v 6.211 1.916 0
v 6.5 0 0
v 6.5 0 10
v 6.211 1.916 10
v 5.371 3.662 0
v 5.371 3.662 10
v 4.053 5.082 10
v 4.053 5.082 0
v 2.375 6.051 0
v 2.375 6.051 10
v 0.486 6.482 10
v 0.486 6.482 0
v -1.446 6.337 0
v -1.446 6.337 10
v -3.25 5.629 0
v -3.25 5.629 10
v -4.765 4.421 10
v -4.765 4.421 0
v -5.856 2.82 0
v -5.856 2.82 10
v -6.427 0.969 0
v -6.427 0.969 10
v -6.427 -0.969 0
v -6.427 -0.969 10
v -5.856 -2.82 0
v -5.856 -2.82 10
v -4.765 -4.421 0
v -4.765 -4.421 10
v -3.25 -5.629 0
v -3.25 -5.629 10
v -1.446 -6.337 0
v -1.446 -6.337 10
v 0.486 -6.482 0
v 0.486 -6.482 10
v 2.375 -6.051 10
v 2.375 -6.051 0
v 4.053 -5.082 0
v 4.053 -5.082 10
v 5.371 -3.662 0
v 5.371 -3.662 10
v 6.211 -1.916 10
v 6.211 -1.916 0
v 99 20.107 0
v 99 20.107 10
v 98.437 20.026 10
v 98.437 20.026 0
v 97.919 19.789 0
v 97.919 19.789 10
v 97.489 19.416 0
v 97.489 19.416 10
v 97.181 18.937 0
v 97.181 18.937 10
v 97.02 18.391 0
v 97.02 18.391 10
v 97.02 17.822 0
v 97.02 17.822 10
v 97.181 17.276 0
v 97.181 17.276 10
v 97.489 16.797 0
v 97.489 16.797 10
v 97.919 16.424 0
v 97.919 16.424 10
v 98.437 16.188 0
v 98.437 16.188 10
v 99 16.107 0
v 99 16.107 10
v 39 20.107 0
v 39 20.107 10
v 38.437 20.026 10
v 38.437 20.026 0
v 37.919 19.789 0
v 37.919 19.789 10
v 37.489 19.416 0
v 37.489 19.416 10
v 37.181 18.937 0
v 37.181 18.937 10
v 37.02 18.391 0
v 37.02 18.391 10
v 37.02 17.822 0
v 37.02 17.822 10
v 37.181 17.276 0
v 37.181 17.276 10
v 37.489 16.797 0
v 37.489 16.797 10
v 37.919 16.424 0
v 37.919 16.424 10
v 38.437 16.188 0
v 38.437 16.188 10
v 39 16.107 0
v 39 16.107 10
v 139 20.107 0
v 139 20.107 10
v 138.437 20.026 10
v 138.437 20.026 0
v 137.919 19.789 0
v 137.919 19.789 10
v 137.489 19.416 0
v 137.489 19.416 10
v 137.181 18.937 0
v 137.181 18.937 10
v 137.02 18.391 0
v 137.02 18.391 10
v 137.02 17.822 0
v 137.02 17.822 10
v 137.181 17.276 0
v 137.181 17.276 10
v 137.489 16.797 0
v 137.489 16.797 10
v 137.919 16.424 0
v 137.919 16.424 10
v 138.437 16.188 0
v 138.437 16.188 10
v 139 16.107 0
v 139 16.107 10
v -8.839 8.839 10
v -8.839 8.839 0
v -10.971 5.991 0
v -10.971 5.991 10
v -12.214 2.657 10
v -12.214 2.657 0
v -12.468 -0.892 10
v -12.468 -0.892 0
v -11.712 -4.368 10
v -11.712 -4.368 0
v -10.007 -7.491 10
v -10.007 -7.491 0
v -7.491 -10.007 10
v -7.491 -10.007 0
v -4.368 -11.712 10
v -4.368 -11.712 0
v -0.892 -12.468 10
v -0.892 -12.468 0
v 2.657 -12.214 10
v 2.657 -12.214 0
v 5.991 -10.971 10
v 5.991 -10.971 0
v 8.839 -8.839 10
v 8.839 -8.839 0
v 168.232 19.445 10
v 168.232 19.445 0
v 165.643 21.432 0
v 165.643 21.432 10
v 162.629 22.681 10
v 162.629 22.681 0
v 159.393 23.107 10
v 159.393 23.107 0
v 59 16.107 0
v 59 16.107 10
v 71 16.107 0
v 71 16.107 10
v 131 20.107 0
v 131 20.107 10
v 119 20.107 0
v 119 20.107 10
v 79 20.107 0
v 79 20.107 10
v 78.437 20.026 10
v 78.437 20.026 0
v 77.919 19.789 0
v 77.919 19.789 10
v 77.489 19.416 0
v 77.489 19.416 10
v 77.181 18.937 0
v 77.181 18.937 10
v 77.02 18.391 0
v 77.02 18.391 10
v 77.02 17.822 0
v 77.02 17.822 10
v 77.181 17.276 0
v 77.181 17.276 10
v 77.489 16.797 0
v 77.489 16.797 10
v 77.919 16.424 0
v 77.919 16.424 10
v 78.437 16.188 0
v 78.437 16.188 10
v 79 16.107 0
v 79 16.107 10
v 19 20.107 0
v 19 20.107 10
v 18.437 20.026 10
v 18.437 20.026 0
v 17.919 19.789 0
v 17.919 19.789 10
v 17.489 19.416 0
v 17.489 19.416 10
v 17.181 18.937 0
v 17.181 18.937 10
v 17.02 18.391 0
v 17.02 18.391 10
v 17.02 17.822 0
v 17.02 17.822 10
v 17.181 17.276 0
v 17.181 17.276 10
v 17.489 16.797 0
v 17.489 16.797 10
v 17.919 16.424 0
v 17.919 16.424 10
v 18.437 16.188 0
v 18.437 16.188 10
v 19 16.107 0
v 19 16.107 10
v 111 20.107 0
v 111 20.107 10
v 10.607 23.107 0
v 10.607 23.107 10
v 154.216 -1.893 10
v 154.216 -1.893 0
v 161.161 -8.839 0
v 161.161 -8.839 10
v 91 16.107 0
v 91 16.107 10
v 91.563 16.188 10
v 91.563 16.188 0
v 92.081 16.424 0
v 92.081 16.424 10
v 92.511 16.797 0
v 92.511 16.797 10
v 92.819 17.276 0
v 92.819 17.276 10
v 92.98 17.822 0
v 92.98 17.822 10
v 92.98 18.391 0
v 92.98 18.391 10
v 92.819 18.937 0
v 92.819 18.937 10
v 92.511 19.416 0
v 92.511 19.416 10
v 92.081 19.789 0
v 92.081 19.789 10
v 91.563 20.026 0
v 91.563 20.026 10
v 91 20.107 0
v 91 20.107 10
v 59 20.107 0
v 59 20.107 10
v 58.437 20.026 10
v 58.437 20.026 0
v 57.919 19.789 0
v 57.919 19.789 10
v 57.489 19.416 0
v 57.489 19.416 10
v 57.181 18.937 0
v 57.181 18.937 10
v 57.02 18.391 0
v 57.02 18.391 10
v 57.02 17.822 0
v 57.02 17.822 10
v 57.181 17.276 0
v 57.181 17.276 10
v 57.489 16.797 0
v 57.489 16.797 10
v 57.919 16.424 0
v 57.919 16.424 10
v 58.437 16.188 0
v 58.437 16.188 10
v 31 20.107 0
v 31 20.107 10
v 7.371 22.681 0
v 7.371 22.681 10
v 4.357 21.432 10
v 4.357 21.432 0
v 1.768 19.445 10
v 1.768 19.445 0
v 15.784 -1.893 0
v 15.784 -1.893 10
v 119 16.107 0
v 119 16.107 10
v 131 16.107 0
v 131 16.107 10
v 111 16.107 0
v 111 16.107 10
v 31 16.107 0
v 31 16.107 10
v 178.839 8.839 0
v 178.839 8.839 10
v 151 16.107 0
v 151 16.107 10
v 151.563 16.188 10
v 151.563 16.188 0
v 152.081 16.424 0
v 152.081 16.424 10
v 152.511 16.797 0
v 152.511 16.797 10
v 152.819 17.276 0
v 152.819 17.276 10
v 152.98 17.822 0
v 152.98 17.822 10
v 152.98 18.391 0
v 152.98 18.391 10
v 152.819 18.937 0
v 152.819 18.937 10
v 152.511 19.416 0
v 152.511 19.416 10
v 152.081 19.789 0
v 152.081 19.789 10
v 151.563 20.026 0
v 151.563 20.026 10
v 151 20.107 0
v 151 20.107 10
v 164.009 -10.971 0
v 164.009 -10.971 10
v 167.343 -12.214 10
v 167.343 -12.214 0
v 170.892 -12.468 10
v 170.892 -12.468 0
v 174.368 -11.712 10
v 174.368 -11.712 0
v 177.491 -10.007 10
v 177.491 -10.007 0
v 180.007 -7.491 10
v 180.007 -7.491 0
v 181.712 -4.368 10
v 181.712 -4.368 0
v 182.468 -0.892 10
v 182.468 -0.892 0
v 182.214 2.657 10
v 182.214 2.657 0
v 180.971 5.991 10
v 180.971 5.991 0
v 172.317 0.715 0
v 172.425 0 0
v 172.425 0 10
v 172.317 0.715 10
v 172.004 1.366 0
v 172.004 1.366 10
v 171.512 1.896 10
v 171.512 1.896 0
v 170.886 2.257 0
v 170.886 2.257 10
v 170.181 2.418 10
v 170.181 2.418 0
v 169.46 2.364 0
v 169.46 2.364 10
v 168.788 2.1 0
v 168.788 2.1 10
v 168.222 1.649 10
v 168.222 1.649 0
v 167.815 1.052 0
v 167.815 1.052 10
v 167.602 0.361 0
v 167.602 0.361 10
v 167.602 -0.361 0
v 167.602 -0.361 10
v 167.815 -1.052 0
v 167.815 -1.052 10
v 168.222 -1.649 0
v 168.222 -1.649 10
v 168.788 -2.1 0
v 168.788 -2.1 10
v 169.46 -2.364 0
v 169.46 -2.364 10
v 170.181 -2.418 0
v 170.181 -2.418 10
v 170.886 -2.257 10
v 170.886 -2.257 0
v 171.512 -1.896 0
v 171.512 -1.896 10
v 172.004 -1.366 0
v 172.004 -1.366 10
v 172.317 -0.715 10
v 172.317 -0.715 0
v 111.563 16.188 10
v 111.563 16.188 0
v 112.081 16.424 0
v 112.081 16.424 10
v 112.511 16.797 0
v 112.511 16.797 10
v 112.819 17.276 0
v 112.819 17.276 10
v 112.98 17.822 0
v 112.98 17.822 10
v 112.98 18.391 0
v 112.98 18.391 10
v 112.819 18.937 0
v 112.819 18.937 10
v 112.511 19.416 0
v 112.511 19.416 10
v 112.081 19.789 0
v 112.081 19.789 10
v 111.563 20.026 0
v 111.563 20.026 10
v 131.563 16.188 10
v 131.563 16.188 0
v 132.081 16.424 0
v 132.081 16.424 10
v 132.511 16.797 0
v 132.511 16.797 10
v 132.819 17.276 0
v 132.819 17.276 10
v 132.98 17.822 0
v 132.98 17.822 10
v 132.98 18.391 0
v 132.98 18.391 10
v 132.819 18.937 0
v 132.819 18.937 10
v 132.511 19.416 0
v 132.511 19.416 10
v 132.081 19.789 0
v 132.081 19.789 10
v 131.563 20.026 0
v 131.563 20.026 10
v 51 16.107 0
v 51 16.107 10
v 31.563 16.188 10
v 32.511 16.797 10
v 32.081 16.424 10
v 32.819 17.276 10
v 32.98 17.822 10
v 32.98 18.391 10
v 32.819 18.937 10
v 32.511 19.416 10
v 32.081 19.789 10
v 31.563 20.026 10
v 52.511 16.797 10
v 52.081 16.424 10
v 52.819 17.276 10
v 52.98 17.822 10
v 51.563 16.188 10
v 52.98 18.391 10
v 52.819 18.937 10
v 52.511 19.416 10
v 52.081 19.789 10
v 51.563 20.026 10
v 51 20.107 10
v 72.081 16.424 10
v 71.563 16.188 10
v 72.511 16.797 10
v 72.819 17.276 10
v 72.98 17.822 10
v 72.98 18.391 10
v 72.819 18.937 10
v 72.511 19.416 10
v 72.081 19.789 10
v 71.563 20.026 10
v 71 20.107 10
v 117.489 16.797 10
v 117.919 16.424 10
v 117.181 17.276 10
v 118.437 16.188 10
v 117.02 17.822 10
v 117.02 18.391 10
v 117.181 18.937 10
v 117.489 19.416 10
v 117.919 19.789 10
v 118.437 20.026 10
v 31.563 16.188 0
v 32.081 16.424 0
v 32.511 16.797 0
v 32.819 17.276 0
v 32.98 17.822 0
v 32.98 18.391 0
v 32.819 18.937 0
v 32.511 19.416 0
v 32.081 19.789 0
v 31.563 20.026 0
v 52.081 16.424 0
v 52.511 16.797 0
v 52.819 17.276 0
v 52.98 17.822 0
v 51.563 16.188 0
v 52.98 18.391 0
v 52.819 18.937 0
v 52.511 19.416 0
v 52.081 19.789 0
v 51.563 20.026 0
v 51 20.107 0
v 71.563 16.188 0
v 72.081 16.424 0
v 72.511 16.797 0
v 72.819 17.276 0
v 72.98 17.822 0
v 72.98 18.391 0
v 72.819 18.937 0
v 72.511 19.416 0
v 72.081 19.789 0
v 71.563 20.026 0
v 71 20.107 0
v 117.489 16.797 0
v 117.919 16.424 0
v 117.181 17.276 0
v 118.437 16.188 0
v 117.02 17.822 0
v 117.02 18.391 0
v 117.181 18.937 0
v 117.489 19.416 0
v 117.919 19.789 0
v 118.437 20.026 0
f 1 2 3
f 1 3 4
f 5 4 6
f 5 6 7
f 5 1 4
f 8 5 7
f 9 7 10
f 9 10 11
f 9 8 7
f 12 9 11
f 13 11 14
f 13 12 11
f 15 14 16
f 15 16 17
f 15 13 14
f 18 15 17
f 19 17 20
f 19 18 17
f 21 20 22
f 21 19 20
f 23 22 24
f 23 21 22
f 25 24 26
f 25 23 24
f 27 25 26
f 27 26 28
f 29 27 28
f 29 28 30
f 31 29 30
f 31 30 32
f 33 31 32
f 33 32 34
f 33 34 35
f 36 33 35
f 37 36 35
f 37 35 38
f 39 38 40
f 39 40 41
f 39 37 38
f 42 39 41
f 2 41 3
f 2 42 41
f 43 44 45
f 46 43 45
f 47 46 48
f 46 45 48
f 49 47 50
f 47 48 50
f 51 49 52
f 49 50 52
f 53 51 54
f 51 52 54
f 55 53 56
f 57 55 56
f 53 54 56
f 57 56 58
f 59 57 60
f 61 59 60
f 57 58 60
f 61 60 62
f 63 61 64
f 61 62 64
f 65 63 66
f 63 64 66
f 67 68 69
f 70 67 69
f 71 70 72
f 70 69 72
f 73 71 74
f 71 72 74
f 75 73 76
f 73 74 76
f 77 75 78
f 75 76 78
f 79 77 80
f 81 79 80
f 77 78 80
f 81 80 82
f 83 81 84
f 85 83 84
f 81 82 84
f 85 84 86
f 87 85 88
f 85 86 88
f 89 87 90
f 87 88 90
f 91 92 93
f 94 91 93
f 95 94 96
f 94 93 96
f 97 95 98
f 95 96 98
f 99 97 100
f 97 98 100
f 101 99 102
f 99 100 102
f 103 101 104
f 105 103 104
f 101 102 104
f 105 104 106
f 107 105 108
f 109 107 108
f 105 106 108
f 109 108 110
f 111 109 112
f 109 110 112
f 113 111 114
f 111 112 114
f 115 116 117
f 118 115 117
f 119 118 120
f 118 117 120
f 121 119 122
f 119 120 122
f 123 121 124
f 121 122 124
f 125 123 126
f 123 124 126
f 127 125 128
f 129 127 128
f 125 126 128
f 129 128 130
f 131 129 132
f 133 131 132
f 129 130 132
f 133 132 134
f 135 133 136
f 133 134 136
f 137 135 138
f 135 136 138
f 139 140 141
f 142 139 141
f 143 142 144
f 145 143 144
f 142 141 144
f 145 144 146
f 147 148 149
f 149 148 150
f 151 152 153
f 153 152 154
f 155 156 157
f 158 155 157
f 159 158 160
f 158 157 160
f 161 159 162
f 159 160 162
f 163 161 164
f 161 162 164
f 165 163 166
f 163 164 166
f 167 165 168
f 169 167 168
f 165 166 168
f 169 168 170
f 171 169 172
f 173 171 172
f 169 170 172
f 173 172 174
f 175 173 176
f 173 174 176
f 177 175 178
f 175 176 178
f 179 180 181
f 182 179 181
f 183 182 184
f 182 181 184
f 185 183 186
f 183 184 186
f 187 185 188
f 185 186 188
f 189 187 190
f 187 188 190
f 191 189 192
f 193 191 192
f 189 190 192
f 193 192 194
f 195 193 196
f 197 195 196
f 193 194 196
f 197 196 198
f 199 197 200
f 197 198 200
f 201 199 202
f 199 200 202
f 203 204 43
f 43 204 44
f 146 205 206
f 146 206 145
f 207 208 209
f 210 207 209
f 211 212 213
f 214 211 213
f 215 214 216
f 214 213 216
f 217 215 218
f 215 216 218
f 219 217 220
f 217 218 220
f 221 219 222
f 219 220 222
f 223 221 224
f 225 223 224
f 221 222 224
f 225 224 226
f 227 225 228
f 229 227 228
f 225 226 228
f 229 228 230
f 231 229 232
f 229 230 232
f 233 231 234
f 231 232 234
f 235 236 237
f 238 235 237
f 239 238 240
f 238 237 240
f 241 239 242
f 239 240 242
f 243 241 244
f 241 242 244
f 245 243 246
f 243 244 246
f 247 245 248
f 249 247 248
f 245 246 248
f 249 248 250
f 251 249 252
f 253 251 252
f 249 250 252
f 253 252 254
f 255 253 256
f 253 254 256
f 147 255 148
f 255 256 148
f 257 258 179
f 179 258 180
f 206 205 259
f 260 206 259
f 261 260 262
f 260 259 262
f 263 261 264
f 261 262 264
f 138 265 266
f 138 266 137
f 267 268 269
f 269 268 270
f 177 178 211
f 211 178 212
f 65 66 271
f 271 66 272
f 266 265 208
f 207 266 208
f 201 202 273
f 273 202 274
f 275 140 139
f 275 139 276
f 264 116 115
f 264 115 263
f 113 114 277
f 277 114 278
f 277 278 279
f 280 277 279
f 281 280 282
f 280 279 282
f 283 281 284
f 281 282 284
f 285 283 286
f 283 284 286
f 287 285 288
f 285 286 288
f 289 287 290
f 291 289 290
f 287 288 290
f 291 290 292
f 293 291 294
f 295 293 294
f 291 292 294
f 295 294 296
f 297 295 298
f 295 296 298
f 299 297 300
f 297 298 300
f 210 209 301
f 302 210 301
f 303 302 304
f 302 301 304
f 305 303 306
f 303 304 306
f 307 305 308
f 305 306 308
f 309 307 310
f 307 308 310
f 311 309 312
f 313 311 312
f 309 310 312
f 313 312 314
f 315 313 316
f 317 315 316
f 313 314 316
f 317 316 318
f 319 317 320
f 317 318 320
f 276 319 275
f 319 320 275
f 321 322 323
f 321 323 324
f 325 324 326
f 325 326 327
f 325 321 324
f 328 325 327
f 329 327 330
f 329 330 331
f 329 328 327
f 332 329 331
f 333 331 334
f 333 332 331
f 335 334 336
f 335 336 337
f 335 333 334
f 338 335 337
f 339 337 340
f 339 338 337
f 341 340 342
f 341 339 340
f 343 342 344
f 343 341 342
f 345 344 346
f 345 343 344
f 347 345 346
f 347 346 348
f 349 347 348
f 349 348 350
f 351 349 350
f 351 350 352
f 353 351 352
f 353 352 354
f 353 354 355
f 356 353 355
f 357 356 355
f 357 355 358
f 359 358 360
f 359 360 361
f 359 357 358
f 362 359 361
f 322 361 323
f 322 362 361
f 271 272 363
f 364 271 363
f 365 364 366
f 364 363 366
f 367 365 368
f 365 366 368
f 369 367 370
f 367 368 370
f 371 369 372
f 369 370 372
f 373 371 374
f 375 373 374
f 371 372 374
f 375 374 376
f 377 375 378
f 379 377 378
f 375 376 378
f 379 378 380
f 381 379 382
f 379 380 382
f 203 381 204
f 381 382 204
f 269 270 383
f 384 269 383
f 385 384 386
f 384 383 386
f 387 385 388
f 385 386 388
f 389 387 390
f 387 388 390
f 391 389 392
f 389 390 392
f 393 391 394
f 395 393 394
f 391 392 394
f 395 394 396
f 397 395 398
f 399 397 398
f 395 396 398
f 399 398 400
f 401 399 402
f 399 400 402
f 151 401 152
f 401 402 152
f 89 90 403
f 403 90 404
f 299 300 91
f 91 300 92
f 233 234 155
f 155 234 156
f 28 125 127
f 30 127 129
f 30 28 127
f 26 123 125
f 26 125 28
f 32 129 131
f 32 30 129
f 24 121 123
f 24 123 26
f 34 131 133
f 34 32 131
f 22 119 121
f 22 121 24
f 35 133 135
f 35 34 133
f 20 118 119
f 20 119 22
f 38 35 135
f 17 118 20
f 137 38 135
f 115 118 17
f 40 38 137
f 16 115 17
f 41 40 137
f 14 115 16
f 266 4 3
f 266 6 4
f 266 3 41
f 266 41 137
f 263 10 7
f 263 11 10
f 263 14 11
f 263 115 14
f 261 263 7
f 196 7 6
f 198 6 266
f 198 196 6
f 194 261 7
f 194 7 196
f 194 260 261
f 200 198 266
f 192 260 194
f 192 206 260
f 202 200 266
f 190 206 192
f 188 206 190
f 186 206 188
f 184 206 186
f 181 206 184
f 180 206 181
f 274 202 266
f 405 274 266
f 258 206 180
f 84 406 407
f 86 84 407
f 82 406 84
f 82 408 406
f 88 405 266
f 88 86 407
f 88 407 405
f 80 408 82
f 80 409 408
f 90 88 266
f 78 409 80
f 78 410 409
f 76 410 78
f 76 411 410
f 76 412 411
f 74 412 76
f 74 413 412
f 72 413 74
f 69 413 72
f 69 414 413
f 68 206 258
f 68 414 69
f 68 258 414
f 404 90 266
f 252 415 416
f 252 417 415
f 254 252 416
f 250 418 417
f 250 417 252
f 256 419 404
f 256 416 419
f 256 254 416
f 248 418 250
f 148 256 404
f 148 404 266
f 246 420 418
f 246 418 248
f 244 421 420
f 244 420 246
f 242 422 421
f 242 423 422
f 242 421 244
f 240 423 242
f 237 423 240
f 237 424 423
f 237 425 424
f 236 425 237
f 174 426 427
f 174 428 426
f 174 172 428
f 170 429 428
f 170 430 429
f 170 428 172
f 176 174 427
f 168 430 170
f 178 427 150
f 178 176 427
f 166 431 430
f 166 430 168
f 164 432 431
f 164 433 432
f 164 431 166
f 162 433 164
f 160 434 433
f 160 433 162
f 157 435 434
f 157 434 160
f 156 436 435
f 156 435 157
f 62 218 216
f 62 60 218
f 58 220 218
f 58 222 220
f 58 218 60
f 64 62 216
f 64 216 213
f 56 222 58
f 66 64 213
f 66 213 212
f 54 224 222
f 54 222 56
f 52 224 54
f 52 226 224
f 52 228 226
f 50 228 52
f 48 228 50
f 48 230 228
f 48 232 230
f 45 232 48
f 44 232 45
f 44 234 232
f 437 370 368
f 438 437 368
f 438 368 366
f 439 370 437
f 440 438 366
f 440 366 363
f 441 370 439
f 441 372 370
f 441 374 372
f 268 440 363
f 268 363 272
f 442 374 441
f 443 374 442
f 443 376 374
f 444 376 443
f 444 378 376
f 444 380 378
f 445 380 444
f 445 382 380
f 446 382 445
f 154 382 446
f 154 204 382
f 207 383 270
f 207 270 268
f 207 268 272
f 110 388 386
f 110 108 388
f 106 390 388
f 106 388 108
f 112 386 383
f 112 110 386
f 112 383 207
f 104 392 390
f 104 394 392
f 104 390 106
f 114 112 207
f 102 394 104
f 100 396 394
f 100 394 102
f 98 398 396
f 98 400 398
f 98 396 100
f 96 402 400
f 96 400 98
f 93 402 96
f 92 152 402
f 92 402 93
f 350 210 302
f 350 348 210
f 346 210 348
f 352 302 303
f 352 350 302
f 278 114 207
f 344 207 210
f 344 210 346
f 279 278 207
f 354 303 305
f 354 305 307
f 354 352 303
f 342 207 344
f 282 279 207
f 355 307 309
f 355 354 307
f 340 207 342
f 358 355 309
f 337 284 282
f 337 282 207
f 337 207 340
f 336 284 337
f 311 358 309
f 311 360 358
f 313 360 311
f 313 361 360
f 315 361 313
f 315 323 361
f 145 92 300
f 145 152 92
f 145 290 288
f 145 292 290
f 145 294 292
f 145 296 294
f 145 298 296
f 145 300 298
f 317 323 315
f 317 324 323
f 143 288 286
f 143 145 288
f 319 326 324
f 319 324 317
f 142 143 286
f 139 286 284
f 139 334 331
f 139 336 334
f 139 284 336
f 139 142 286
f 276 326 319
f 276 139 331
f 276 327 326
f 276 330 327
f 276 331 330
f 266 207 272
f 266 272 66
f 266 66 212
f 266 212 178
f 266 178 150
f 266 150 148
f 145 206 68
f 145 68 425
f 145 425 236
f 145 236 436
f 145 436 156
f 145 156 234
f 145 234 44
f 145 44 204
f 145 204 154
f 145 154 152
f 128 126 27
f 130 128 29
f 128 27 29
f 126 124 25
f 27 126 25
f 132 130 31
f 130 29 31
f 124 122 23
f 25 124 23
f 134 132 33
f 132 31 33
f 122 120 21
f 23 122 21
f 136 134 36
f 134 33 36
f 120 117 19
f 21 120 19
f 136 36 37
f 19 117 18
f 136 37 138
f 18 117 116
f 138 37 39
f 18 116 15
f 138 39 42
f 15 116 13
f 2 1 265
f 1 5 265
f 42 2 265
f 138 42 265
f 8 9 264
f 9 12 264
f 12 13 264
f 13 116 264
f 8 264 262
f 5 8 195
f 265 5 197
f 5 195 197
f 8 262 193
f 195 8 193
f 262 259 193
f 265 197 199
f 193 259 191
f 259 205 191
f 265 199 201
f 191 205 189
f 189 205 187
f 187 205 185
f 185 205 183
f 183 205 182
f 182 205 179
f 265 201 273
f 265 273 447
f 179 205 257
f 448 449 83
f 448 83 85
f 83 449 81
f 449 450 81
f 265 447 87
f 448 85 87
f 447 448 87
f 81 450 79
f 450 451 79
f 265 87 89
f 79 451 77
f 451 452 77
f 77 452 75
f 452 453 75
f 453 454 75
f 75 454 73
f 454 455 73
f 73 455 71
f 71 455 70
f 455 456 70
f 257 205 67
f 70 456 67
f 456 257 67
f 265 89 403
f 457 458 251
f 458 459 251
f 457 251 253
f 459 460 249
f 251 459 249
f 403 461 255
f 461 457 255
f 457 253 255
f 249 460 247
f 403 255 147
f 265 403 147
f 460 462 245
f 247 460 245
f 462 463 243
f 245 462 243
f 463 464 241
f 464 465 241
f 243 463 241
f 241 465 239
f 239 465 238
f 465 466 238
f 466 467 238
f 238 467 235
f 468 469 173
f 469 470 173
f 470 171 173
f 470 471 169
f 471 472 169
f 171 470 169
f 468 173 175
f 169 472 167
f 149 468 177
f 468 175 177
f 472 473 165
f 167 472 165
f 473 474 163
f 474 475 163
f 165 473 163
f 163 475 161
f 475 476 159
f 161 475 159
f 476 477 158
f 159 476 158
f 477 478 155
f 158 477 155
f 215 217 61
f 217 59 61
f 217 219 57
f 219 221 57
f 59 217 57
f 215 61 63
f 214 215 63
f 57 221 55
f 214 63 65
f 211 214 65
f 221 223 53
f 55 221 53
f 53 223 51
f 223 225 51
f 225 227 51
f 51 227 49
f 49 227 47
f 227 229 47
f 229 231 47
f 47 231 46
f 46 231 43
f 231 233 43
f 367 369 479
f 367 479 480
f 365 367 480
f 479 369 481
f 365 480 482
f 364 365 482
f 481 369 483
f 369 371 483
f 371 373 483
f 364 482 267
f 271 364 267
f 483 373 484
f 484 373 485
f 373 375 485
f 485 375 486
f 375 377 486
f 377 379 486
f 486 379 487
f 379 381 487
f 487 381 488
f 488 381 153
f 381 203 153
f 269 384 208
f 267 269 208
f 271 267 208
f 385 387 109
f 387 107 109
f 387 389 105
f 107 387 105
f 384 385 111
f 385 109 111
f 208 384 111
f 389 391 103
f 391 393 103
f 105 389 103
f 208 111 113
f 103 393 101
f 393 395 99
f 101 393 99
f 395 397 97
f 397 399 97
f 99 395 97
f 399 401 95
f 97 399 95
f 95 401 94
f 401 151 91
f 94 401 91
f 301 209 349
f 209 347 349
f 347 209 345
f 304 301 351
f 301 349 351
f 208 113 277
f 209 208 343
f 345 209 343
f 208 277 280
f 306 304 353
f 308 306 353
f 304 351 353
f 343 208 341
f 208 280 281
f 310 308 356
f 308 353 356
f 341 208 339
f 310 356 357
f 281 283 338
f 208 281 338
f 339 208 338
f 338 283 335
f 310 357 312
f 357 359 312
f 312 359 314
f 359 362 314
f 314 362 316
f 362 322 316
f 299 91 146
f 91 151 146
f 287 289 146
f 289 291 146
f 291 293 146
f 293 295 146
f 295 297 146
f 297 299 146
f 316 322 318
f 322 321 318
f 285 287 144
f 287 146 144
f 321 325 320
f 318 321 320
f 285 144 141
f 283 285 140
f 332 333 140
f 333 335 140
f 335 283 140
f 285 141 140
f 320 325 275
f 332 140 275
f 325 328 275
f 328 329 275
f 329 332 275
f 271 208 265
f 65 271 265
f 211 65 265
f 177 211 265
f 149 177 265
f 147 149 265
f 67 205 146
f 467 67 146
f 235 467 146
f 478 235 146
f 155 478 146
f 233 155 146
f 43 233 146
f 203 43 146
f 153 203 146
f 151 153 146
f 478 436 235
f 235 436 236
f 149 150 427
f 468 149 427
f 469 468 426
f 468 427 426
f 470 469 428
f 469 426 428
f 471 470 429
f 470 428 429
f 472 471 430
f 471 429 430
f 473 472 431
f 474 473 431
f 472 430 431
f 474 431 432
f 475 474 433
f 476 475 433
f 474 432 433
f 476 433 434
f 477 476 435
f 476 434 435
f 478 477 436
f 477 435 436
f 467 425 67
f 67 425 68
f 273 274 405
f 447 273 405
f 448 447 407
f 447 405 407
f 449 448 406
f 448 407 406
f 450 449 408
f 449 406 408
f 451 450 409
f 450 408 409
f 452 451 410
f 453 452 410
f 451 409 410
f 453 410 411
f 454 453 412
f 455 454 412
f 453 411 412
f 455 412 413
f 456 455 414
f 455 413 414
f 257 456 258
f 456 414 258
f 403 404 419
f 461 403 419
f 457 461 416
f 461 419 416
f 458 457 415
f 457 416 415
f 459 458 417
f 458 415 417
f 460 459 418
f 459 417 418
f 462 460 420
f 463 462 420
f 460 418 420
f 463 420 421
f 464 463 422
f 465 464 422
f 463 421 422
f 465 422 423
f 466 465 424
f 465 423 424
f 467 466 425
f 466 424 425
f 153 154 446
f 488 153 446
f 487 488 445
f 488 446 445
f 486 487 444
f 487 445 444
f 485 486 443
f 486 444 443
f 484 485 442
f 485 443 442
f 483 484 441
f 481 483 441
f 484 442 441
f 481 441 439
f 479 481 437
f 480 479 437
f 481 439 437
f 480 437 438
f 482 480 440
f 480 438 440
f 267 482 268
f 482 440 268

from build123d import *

# Parameters (mm, degrees)
SKETCH_R               = 6.5
SKETCH_R_2             = 2.425
PAD_DEPTH              = 10
POCKET_DEPTH           = 15
LINEARPATTERN_COUNT    = 4
LINEARPATTERN_PITCH    = 20
LINEARPATTERN001_COUNT = 4
LINEARPATTERN001_PITCH = 20


with BuildPart() as part:
    # Sketch → Pad (new body)
    with BuildSketch(Plane.XY):
        with BuildLine():
            ThreePointArc((-8.838835, 8.838835), (-8.838835, -8.838835), (8.838835, -8.838835))
            Line((15.784271, -1.893398), (8.838835, -8.838835))
            Line((15.784271, -1.893398), (154.215729, -1.893398))
            Line((154.215729, -1.893398), (161.161165, -8.838835))
            ThreePointArc((161.161165, -8.838835), (178.838835, -8.838835), (178.838835, 8.838835))
            Line((168.232233, 19.445436), (178.838835, 8.838835))
            ThreePointArc((168.232233, 19.445436), (164.176941, 22.155096), (159.393398, 23.106602))
            Line((10.606602, 23.106602), (159.393398, 23.106602))
            ThreePointArc((10.606602, 23.106602), (5.823059, 22.155096), (1.767767, 19.445436))
            Line((-8.838835, 8.838835), (1.767767, 19.445436))
        make_face()
        Circle(SKETCH_R, mode=Mode.SUBTRACT)
        with Locations((170, 0)):
            Circle(SKETCH_R_2, mode=Mode.SUBTRACT)
    extrude(amount=PAD_DEPTH)

    # Sketch001 (on Face14 of Pad) → Pocket (cut)
    with BuildSketch(Plane.XY.offset(10)):
        with BuildLine():
            ThreePointArc((79, 20.106602), (77, 18.106602), (79, 16.106602))
            Line((79, 16.106602), (91, 16.106602))
            ThreePointArc((91, 16.106602), (93, 18.106602), (91, 20.106602))
            Line((91, 20.106602), (79, 20.106602))
        make_face()
    pocket = extrude(amount=-POCKET_DEPTH, mode=Mode.SUBTRACT)

    # LinearPattern: Pocket ×4
    with Locations(*[(i * LINEARPATTERN_PITCH, 0, 0) for i in range(1, LINEARPATTERN_COUNT)]):
        add(pocket, mode=Mode.SUBTRACT)

    # LinearPattern001: Pocket ×4
    with Locations(*[(-i * LINEARPATTERN001_PITCH, 0, 0) for i in range(1, LINEARPATTERN001_COUNT)]):
        add(pocket, mode=Mode.SUBTRACT)


solid = part.part
